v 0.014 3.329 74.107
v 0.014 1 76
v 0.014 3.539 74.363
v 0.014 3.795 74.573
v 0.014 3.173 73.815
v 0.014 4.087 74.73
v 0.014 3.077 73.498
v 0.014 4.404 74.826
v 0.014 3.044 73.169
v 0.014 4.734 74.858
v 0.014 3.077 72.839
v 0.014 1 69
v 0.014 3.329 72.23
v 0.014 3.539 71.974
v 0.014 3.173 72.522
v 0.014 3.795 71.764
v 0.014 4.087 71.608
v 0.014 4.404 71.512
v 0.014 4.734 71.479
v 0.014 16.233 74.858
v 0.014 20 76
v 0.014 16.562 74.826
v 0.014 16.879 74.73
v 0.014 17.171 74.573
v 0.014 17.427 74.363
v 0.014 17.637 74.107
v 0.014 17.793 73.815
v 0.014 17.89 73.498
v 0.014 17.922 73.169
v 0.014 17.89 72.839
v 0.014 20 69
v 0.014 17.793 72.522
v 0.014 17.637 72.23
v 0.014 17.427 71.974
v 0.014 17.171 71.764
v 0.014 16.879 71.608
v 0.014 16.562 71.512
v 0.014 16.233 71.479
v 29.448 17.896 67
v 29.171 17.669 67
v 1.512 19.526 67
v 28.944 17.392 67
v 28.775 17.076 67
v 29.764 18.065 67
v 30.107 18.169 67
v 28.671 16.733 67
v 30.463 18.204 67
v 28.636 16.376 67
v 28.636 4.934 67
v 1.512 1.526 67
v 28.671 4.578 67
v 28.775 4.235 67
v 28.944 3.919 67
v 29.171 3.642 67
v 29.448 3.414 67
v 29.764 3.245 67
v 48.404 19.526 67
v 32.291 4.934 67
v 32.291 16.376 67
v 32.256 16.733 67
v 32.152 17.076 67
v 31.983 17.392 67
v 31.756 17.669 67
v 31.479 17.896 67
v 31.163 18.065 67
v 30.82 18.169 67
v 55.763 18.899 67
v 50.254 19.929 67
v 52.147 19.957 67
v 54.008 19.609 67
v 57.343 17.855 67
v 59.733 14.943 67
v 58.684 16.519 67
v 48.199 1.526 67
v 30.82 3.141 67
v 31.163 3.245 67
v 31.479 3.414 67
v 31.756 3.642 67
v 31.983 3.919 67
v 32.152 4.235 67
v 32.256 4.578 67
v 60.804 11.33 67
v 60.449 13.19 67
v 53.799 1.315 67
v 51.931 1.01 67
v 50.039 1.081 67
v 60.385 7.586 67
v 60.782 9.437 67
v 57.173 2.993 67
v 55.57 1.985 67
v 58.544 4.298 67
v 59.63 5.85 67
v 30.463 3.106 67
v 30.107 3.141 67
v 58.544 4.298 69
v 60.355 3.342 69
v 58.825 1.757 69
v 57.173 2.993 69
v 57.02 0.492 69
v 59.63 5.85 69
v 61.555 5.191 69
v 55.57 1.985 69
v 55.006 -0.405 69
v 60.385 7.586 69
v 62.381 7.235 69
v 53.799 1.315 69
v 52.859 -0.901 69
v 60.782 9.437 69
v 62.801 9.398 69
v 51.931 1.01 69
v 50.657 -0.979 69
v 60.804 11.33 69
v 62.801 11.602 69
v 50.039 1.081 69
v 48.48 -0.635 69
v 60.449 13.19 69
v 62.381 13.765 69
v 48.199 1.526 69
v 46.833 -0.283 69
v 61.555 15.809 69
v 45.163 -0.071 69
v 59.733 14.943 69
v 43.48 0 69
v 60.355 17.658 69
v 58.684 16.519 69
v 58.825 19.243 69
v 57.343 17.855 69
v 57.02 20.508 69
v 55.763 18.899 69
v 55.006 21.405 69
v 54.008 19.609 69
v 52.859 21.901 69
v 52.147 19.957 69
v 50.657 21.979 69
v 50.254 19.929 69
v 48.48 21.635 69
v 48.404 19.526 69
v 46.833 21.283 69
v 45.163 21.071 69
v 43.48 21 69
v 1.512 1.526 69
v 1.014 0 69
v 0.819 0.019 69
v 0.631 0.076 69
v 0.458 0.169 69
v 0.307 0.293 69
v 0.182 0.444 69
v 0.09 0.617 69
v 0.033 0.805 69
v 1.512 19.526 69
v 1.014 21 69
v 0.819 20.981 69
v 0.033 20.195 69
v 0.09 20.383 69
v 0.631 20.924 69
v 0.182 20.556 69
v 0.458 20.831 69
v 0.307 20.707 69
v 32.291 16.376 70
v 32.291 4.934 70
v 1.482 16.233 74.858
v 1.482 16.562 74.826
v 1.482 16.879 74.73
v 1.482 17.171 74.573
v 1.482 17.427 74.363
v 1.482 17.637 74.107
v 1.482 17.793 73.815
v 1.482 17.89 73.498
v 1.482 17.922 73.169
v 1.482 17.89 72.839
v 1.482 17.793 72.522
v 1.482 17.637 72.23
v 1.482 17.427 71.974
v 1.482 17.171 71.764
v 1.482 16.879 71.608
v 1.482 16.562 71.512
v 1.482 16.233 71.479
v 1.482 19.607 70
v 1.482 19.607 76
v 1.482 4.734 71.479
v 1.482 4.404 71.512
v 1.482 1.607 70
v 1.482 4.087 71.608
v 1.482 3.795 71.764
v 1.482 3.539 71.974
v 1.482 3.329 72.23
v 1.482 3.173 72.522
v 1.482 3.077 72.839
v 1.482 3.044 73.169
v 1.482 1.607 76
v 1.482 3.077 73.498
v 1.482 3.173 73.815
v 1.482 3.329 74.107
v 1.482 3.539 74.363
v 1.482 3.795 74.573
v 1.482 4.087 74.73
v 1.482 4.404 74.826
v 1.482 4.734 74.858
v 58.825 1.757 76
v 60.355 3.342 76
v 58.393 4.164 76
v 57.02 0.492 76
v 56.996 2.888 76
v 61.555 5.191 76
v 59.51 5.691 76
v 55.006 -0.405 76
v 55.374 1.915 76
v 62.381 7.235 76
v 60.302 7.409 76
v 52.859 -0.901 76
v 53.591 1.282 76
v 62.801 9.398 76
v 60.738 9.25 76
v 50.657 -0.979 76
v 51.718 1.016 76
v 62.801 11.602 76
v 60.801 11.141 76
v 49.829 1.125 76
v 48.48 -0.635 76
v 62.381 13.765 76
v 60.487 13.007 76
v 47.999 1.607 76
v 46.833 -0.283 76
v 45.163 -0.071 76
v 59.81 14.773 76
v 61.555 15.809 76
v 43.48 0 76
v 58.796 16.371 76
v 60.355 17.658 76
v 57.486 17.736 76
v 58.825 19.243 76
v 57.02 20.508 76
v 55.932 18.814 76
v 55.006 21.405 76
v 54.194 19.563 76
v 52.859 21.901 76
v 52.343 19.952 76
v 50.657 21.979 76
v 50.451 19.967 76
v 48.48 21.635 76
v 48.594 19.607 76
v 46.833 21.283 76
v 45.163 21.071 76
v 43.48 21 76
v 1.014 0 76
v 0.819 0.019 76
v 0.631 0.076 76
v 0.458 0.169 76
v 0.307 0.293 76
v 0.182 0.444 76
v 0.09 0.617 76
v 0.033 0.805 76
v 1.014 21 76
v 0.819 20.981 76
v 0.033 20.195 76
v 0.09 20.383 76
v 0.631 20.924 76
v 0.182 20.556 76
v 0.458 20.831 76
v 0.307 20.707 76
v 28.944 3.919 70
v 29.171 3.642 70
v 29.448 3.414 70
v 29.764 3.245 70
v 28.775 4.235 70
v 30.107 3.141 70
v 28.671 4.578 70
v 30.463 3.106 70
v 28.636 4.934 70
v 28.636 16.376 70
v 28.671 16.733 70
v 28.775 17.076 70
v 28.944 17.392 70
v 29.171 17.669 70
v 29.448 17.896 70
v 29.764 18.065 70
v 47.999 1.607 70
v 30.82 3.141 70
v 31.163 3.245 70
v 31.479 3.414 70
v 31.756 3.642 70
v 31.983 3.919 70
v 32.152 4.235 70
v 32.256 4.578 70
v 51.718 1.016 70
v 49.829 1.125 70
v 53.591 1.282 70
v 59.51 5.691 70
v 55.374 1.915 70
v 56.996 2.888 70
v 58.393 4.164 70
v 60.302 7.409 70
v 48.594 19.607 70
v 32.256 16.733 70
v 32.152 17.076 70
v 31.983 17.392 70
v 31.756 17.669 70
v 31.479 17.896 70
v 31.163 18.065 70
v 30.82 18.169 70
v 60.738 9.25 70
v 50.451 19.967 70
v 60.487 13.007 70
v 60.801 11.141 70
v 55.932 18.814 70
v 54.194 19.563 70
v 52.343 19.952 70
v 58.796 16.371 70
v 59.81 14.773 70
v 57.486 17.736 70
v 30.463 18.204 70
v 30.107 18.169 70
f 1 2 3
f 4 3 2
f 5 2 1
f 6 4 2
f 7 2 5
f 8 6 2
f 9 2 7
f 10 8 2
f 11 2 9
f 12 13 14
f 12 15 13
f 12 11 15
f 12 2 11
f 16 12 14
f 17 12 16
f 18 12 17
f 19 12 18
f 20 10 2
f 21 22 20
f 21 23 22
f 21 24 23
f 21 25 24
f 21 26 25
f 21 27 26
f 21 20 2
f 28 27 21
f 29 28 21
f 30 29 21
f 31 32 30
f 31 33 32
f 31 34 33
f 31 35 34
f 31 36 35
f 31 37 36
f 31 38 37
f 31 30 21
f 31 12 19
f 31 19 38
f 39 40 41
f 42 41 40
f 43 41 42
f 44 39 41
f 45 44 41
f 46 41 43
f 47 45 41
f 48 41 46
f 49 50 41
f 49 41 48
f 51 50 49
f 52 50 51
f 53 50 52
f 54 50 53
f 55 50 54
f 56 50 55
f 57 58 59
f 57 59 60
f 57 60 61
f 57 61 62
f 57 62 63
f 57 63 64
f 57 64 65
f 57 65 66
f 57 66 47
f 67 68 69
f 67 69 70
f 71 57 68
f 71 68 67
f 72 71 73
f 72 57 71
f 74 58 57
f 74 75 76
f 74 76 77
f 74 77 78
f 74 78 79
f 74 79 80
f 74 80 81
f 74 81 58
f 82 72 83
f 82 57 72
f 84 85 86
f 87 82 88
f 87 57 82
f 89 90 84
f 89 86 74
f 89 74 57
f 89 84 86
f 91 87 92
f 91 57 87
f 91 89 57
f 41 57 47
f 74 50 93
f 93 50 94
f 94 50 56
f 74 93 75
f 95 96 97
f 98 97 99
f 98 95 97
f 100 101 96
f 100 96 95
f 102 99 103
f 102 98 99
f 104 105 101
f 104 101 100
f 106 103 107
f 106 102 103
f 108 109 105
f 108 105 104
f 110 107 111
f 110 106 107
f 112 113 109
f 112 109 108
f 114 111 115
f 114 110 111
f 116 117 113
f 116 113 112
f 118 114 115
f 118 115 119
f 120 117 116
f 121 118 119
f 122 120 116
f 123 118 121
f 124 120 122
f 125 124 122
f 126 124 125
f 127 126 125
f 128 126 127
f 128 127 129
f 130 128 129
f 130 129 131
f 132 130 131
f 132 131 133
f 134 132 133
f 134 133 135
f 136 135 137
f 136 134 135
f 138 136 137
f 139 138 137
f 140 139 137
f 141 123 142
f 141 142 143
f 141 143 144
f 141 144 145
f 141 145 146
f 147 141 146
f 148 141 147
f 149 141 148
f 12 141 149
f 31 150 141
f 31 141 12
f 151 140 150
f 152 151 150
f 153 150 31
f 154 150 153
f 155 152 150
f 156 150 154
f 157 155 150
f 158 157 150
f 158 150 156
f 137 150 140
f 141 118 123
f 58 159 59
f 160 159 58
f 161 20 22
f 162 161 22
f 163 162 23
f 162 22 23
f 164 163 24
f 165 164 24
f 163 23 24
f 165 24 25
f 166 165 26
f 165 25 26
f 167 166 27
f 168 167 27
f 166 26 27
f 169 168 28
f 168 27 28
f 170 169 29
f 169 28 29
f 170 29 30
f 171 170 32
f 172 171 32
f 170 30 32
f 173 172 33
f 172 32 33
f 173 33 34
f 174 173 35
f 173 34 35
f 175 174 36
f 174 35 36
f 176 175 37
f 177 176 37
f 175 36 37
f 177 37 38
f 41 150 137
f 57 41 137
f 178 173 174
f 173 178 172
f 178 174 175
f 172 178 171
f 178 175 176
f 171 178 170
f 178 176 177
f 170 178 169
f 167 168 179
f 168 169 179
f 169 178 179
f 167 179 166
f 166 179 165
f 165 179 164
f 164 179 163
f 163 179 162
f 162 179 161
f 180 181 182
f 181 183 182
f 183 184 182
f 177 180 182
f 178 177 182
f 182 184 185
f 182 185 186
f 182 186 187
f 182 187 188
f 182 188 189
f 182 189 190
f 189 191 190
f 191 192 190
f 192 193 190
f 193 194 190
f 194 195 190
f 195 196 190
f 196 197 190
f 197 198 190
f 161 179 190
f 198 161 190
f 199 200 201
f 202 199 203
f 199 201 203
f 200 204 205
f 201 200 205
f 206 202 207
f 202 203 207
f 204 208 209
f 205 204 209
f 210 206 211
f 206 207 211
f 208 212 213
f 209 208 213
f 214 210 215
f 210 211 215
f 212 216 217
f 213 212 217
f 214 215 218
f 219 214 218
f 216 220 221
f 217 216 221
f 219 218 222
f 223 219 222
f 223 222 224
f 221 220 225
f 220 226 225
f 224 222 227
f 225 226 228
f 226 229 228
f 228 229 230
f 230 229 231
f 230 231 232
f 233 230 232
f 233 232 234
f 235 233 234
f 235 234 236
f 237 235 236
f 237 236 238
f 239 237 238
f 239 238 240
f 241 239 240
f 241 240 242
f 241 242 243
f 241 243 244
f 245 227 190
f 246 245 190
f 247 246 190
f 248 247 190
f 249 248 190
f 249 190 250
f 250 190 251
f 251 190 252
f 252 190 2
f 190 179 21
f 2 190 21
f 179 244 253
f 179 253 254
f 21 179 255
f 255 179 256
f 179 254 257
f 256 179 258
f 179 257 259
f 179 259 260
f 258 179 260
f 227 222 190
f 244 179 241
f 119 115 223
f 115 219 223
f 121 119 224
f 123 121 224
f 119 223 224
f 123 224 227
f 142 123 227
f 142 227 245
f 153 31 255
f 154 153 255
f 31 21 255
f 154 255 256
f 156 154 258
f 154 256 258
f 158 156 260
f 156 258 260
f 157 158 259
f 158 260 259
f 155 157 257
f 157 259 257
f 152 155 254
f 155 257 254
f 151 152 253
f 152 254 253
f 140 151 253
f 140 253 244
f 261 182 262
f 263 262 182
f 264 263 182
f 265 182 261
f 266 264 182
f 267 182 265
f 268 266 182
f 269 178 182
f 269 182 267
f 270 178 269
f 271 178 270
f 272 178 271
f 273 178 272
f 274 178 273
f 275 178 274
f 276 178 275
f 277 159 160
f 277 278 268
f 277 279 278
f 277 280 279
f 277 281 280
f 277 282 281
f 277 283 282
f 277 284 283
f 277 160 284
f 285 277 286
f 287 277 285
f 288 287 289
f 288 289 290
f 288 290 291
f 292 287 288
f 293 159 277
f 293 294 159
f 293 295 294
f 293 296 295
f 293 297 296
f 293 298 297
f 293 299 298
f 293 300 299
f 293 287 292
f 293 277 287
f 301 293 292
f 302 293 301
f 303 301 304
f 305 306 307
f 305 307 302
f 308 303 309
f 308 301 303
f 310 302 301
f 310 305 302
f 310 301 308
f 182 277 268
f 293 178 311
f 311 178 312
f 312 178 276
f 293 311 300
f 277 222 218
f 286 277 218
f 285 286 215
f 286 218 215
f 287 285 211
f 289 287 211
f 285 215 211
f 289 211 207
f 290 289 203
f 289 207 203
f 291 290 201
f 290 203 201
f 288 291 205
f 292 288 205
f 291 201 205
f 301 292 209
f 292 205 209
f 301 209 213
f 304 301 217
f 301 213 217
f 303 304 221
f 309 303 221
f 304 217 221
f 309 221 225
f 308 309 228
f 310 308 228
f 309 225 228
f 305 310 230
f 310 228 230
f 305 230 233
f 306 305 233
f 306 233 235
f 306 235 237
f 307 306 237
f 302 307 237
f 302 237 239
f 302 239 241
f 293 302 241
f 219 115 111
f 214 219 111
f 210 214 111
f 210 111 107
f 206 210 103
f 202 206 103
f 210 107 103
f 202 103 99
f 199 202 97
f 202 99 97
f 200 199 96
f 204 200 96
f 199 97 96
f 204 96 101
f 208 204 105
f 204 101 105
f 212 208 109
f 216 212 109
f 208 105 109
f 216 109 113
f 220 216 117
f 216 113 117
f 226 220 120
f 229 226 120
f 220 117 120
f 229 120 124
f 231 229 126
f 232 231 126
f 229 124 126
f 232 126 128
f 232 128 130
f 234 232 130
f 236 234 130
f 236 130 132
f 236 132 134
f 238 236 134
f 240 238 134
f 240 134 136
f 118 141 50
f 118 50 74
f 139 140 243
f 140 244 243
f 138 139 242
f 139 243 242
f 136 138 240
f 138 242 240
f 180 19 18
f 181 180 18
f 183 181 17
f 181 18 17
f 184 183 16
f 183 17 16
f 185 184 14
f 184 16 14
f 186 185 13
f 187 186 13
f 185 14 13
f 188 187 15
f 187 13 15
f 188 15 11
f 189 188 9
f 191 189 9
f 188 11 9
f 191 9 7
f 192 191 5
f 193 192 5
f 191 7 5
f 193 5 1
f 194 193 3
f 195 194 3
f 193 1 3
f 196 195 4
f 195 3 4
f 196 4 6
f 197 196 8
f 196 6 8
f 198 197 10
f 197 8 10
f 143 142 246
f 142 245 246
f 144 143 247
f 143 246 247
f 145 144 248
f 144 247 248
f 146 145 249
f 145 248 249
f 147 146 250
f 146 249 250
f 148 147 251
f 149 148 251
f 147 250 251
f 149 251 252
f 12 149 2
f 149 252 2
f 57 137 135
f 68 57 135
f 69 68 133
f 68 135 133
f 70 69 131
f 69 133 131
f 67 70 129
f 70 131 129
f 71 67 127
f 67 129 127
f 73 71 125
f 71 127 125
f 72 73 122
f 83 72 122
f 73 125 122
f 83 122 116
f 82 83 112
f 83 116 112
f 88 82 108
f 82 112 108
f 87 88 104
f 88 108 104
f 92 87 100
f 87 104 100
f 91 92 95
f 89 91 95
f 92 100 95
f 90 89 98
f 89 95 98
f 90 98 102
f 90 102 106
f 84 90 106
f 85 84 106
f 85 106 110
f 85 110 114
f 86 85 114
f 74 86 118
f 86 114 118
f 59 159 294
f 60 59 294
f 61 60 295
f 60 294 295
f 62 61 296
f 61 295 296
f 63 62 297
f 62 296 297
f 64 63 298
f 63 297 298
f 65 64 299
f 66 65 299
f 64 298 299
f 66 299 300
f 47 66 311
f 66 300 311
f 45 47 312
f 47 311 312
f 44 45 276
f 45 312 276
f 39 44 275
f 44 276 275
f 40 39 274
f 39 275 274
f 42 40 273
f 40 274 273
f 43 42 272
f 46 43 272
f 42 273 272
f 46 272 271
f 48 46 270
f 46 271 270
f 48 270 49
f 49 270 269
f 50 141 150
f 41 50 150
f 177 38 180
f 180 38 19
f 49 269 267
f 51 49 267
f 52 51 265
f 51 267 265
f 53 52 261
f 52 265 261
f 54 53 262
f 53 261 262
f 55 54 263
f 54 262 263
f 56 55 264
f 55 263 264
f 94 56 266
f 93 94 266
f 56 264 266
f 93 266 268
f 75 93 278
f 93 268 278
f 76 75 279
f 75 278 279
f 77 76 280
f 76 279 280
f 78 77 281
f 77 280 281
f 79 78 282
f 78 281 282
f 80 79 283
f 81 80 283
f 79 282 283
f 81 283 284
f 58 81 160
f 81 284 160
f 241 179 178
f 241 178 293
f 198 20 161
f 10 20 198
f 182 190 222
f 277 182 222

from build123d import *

# Parameters (mm, degrees)
PAD_DEPTH       = 7
PAD001_DEPTH    = 2
FILLET_R        = 20
FILLET001_R     = 20
FILLET002_R     = 1
FILLET003_R     = 1
POCKET_DEPTH    = 6
POCKET001_DEPTH = 5
POCKET002_DEPTH = 5


with BuildPart() as part:
    # Sketch003 → Pad (new body)
    with BuildSketch(Plane.XY.offset(69)):
        with BuildLine():
            Line((0.013913, 21), (46.663841, 21))
            ThreePointArc((46.663841, 0), (62.854257, 10.5), (46.663841, 21))
            Line((46.663841, 0), (0.013913, 0))
            Line((0.013913, 0), (0.013913, 21))
        make_face()
    extrude(amount=PAD_DEPTH)

    # Sketch → Pad001 (new body)
    with BuildSketch(Plane(origin=(0, 0, 69), x_dir=(1, 0, 0), z_dir=(0, 0, -1))):
        with BuildLine():
            Line((1.511721, -19.526379), (48.404155, -19.526379))
            ThreePointArc((48.404155, -19.526379), (60.840174, -10.38315), (48.198543, -1.526379))
            Line((1.511721, -1.526379), (48.198543, -1.526379))
            Line((1.511721, -1.526379), (1.511721, -19.526379))
        make_face()
    extrude(amount=PAD001_DEPTH)

    # Fillet
    fillet_edges = [part.edges().sort_by_distance(p)[0] for p in [
        (46.663841, 21, 72.5),
    ]]
    fillet(fillet_edges, radius=FILLET_R)

    # Fillet001
    fillet001_edges = [part.edges().sort_by_distance(p)[0] for p in [
        (46.663841, 0, 72.5),
    ]]
    fillet(fillet001_edges, radius=FILLET001_R)

    # Fillet002
    fillet002_edges = [part.edges().sort_by_distance(p)[0] for p in [
        (0.013913, 0, 72.5),
    ]]
    fillet(fillet002_edges, radius=FILLET002_R)

    # Fillet003
    fillet003_edges = [part.edges().sort_by_distance(p)[0] for p in [
        (0.013913, 21, 72.5),
    ]]
    fillet(fillet003_edges, radius=FILLET003_R)

    # Sketch004 → Pocket (cut)
    with BuildSketch(Plane.XY.offset(76)):
        with BuildLine():
            Line((1.482056, 1.60733), (47.999464, 1.60733))
            ThreePointArc((47.999464, 1.60733), (60.81663, 10.193947), (48.593783, 19.60733))
            Line((1.482056, 19.60733), (48.593783, 19.60733))
            Line((1.482056, 19.60733), (1.482056, 1.60733))
        make_face()
    extrude(amount=-POCKET_DEPTH, mode=Mode.SUBTRACT)

    # Sketch005 → Pocket001 (cut)
    with BuildSketch(Plane(origin=(0.013913, 0, 69), x_dir=(0, -1, 0), z_dir=(-1, 0, 0))):
        with BuildLine():
            ThreePointArc((-16.232645, 5.858135), (-17.922069, 4.168711), (-16.232645, 2.479286))
            Line((-16.232645, 2.479286), (-4.73362, 2.479286))
            ThreePointArc((-4.73362, 2.479286), (-3.044195, 4.168711), (-4.73362, 5.858135))
            Line((-16.232645, 5.858135), (-4.73362, 5.858135))
        make_face()
    extrude(amount=-POCKET001_DEPTH, mode=Mode.SUBTRACT)

    # Sketch006 → Pocket002 (cut)
    with BuildSketch(Plane.XY.offset(70)):
        with BuildLine():
            ThreePointArc((32.291425, 16.37623), (30.46347, 18.204185), (28.635515, 16.37623))
            Line((28.635515, 16.37623), (28.635515, 4.934208))
            ThreePointArc((28.635515, 4.934208), (30.46347, 3.106253), (32.291425, 4.934208))
            Line((32.291425, 16.37623), (32.291425, 4.934208))
        make_face()
    extrude(amount=-POCKET002_DEPTH, mode=Mode.SUBTRACT)


solid = part.part
